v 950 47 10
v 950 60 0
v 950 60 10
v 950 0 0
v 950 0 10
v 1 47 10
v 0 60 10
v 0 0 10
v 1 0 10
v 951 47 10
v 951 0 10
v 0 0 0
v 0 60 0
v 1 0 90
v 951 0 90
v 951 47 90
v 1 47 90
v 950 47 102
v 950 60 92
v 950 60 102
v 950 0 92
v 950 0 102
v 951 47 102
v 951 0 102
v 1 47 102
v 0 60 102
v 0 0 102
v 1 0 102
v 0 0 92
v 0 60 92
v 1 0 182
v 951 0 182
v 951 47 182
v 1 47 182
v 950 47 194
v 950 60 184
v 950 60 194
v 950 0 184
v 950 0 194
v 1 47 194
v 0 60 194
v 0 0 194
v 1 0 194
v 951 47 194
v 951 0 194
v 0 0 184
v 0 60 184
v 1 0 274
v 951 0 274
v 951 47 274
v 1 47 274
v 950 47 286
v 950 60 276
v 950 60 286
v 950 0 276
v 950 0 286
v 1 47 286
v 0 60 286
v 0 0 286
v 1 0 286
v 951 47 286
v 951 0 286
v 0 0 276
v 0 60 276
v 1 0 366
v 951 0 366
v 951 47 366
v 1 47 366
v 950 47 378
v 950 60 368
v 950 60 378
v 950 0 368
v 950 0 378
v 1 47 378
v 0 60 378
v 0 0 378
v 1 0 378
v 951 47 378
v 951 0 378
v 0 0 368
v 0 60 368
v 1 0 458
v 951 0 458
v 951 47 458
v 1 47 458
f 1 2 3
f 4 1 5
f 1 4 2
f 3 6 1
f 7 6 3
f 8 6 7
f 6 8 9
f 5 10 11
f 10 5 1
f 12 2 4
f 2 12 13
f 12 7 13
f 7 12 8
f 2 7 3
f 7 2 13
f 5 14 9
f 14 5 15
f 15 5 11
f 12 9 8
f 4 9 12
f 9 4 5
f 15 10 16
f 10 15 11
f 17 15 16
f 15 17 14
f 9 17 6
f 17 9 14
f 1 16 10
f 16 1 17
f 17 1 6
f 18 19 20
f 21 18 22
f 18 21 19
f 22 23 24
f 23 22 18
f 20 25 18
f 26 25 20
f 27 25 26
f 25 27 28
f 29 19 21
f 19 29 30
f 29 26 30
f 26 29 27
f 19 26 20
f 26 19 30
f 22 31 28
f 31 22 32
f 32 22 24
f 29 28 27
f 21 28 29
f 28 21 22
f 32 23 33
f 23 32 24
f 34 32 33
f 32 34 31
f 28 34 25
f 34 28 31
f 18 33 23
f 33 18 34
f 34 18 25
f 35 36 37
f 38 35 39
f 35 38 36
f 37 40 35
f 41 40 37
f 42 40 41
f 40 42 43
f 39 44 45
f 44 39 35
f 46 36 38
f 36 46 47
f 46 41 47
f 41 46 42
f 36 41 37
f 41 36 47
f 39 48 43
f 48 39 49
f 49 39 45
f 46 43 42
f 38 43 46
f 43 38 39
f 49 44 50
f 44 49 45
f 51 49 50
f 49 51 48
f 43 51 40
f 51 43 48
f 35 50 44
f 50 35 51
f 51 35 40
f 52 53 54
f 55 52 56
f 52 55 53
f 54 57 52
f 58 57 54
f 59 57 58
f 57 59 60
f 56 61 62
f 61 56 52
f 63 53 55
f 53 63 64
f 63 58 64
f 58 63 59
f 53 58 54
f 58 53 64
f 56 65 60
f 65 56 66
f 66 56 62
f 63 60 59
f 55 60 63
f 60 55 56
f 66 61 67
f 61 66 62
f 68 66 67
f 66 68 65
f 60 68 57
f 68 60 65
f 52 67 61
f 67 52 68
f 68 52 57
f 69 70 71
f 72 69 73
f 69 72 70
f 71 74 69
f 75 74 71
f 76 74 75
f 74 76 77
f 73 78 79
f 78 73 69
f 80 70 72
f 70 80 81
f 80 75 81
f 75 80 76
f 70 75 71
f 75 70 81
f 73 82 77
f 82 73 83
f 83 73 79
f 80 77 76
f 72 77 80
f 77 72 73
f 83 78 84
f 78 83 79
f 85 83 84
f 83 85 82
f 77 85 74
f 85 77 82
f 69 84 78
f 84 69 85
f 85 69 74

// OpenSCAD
// file: shapes.scad
//helper
{
    /**
 * Standard right-angled triangle
 *
 * @param number  o_len  Length of the opposite side
 * @param number  a_len  Length of the adjacent side
 * @param number  depth  How wide/deep the triangle is in the 3rd dimension
 * @param boolean center Whether to center the triangle on the origin
 * @todo a better way ?
 */
module triangle(o_len, a_len, depth, center=false)
{
    centroid = center ? [-a_len/3, -o_len/3, -depth/2] : [0, 0, 0];
    translate(centroid) linear_extrude(height=depth)
    {
        polygon(points=[[0,0],[a_len,0],[0,o_len]], paths=[[0,1,2]]);
    }
}

module trapez3d(bottom = 30, top = 25, height = 10, length = 172){
    hull(){
            trapez(bottom, top, height);
            translate([length,0,0])
            trapez(bottom, top, height);
    }
}

translate([0,0,0])
trapez3d();

module trapez(bottom = 30, top = 25, height = 10){
    off = (bottom-top);
    CubePoints = [
  [  0,  0,  0 ],  //0
  [ 0,  bottom,  0 ],  //1
  [ 0,  bottom-off,  height ],  //2
  [  0,  off,  height ]  //3
];
CubeFaces = [
  [0,1,2,3]  // bottom
  ]; // left

polyhedron( CubePoints, CubeFaces );
}

}

function step_size(total, bar_width, steps) = (total-bar_width)/steps;

module grid(grid_width=40, grid_height=60, steps_wide=2, steps_high=3, bar_width=1, bar_depth=3, name="grid"){


    step_width = step_size(grid_width, bar_width, steps_wide);
    step_height = step_size(grid_height, bar_width, steps_high);

    if(name != "grid")
        echo (name, " steps ", step_width, step_height);

    if(steps_wide>0){
    for(s_wide=[0:steps_wide]){
        translate([s_wide*step_width,0,0])
        cube([bar_width, bar_depth, grid_height]);
    }}

    if(steps_high>0){
    for(s_height=[0:steps_high]){
        translate([0,0,s_height*step_height])
        cube([grid_width, bar_depth, bar_width]);
    }}

}

function getCenter(value, center=false) = center ? value/2 : value;

//ccube is a cube thats wants to translate itself and prints the upper edge coordingates in preview mode
module ccube(x,y,z,tx=0,ty=0,tz=0, center=false, force_preview=false) {
    translate([tx,ty,tz])
    cube([x,y,z], center);

    if($preview || force_preview){
        dx = tx+getCenter(x,center);
        dy = ty+getCenter(y,center);
        dz = tz+getCenter(z,center);

        translate([dx,dy,dz])
        rotate([90,0,0])
        text(str(dx,", ",dy,", ",dz)); 
    }
}

border = 8;
wide=4;
height=2;
translate([0,70,0])
grid(100,100, wide, height, bar_width=border);

// sample cube to fit in the hole

color("#00FFFF50")
translate([border,68, border])
cube([step_size(100,border,wide)-border,6,step_size(100,border,height)-border]);

ccube(50,20,30,0,140,0, force_preview=true);
// main file
use<shapes.scad>

inner_width = 950;
height_slot = 80;
depth_slot = 47;

depth = 60;

board = 10;
layers = 5;

target_height=460;

calc_slot_height = (target_height/layers);

startpoint=0;
insertStart=0;
layer_height =calc_slot_height;// height_slot+board+1;
echo("layer_height",layer_height);





for(i=[0:layers-1]){
    
    startpoint = i*(layer_height);
    
    insertStart = startpoint+board;
    
    translate([0,0,startpoint])
    color("brown")
        cube([inner_width, depth, board]);

    color("blue",0.2)
    ccube(inner_width, depth_slot, height_slot,1,0,insertStart);
    
    //echo("startpoint", startpoint);  
    //echo("insertStart", insertStart);  
}
